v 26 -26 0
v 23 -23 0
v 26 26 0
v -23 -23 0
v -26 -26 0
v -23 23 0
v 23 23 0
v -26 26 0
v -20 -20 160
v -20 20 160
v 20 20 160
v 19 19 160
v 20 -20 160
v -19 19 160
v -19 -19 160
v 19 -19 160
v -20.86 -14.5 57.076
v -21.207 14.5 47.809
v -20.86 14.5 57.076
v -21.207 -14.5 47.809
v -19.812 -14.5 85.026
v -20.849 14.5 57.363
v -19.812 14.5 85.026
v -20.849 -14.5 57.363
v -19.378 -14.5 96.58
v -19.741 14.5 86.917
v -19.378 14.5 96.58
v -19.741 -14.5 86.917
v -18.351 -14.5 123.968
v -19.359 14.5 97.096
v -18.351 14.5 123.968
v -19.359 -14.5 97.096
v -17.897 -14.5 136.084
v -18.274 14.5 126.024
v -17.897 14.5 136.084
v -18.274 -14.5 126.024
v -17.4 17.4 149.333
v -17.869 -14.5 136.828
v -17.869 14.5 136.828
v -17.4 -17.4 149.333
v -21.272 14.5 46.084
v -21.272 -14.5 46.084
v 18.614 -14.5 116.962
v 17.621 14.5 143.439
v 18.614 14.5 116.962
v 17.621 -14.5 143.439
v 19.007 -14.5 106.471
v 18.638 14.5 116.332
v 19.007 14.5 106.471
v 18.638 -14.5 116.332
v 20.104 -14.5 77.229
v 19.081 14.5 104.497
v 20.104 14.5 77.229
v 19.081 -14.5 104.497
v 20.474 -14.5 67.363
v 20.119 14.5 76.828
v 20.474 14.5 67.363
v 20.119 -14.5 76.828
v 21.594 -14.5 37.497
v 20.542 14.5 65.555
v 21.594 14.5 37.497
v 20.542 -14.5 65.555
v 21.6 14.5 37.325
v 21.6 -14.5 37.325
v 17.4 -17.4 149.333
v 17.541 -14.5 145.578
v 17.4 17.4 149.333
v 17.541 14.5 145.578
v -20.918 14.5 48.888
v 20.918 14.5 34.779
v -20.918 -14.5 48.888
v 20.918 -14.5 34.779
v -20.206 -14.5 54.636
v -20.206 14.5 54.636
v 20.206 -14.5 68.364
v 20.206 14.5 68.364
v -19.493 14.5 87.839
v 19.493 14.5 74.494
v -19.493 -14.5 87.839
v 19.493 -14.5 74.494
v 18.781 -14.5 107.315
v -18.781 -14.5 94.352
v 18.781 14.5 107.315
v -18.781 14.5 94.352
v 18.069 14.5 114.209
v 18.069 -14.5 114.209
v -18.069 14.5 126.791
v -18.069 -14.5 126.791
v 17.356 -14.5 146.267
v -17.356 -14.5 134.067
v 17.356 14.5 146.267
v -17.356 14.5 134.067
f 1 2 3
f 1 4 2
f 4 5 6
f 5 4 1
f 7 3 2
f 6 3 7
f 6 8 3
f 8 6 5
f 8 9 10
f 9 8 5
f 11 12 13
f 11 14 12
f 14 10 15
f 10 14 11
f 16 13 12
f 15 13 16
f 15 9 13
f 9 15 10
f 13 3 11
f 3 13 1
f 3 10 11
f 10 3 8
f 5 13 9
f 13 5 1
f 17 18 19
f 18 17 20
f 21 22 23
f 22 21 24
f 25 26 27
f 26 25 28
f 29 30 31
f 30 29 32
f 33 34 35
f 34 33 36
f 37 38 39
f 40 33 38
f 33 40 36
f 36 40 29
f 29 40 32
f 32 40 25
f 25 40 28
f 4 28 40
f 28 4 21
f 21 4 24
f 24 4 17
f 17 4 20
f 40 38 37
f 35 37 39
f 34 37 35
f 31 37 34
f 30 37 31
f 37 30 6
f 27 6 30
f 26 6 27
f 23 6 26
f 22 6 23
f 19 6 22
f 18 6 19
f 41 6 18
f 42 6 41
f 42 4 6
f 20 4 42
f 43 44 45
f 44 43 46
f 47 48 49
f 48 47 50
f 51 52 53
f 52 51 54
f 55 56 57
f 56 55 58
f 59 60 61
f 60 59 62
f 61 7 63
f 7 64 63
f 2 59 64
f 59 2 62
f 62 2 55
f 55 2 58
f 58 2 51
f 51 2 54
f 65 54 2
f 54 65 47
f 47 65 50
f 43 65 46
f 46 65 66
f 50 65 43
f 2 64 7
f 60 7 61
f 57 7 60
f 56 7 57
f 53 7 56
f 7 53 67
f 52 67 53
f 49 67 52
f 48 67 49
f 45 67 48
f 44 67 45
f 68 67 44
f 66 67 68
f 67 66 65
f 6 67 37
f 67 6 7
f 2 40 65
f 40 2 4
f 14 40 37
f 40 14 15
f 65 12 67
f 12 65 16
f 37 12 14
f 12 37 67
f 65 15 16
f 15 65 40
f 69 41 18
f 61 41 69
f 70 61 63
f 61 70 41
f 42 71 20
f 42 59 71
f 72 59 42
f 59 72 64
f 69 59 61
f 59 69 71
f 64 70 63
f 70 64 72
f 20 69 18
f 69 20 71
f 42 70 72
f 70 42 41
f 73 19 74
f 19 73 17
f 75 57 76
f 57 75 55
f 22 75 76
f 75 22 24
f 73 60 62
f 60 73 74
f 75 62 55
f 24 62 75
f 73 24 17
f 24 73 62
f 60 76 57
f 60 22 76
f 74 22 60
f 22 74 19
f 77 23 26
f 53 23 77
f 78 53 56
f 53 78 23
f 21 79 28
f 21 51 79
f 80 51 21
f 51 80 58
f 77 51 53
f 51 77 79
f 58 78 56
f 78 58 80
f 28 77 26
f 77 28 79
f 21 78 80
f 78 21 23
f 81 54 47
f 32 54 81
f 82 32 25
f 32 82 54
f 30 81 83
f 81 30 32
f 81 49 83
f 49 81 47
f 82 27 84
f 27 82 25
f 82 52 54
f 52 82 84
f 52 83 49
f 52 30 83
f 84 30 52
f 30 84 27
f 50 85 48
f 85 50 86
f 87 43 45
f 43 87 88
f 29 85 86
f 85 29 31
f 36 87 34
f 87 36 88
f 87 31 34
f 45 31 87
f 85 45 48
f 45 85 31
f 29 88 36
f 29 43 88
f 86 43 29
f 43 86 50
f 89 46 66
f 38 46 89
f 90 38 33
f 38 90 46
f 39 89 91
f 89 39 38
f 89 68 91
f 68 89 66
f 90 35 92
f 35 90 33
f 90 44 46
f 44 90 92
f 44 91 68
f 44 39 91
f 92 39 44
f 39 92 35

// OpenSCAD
// ======================================================
// Dice Tower (tapered shell) + DIAGONAL baffles (wall-to-wall)
// Baffles tilt across X (rotate about Y) and alternate each level
// ======================================================
$fn = 64;

// ---------- Tower geometry ----------
tower_h       = 160;   // body height (not counting cap)
outer_w_bot   = 52;    // outer width at base
outer_w_top   = 40;    // outer width at top
wall          = 3;     // wall thickness
cap_h         = 18;    // little pyramid cap

// Inner chute (constant rectangle, centered)
chute_w       = 32;    // X (give chunky d20s room)
chute_d       = 32;    // Y

// Exit opening (front = +Y)
base_clear_h  = 22;
exit_w        = 34;
exit_h        = 20;

// Funnel at top
funnel_h      = 20;
funnel_over   = 3;

// ---------- Baffles (DIAGONAL across X) ----------
num_baffles       = 6;
baffle_t          = 2.8;
baffle_angle_deg  = 15;     // slope across X (left high → right low, then flip)
baffle_margin     = 10;     // top/bottom margin before first/after last
y_clear_from_wall = 1.5;    // clearance from front/back walls (Y)
x_overlap         = 0.6;    // bite into side walls so shelves fuse

// ---------- helpers ----------
module taper(wb, wt, h){ linear_extrude(h, scale=wt/wb) square([wb,wb], center=true); }
function iw_bot() = outer_w_bot - 2*wall;
function iw_top() = outer_w_top - 2*wall;
function inner_w_at_z(z) = iw_bot() + (iw_top() - iw_bot()) * (z / tower_h);

// ---------- outer shell ----------
module outer_shell(){
  union(){
    taper(outer_w_bot, outer_w_top, tower_h);
    translate([0,0,tower_h])
      polyhedron(
        points=[[0,0,cap_h],
                [ outer_w_top/2,  outer_w_top/2, 0],
                [-outer_w_top/2,  outer_w_top/2, 0],
                [-outer_w_top/2, -outer_w_top/2, 0],
                [ outer_w_top/2, -outer_w_top/2, 0]],
        faces=[[0,1,2],[0,2,3],[0,3,4],[0,4,1],[1,2,3,4]]);
  }
}

// ---------- subtractions ----------
module inner_cavity_taper(){ taper(iw_bot(), iw_top(), tower_h); }
module main_chute(){ linear_extrude(tower_h) square([chute_w, chute_d], center=true); }
module exit_window(){
  translate([0,0,base_clear_h + exit_h/2])
    rotate([90,0,0]) cube([exit_w, wall*2+0.2, exit_h], center=true);
}
module top_funnel(){
  fw_top = chute_w + 2*funnel_over;
  fw_bot = iw_top() - 2;
  fh     = min(funnel_h, tower_h*0.35);
  translate([0,0,tower_h - fh]) taper(fw_bot, fw_top, fh);
}

// ---------- DIAGONAL baffles (tilt across X, alternate) ----------
module baffles_diagonal(){
  usable_h = (tower_h - base_clear_h) - 2*baffle_margin;
  spacing  = usable_h / max(num_baffles,1);

  // size in Y (front/back) – centered with a small gap to both walls
  len_y = chute_d - 2*y_clear_from_wall;

  for(i=[0:num_baffles-1]){
    zc   = base_clear_h + baffle_margin + spacing*(i+0.5);
    iw_z = inner_w_at_z(zc);             // inner width between side walls at this Z

    // span left→right with a little bite into both side walls so it fuses
    len_x = iw_z + 2*x_overlap;

    // alternate slope across X: even -> left high/right low, odd -> reverse
    sign = (i % 2 == 0) ? 1 : -1;
    tilt = sign * baffle_angle_deg;

    // place shelf centered in X and Y, then tilt around Y so one side is lower
    translate([0, 0, zc])
      rotate([0, tilt, 0])       // <— rotate about Y to make a LEFT↔RIGHT slope
        cube([len_x, len_y, baffle_t], center=true);
  }
}

// ---------- assembly ----------
difference(){
  outer_shell();
  inner_cavity_taper();
  main_chute();    // ensures a straight chute inside the tapered shell
  exit_window();
  top_funnel();
}
baffles_diagonal();

/* Tuning:
- Want a stronger slope?   baffle_angle_deg = 18–20
- Easier bridging?         baffle_t = 3.0
- More room for big dice?  chute_w = chute_d = 34
- Shelves touching side walls more obviously? increase x_overlap to 1.0
- If you prefer the “front/back hug” style instead, tell me and I’ll swap the
  tilt axis (rotate about X) and add the exact Y wall gap computation.
*/
